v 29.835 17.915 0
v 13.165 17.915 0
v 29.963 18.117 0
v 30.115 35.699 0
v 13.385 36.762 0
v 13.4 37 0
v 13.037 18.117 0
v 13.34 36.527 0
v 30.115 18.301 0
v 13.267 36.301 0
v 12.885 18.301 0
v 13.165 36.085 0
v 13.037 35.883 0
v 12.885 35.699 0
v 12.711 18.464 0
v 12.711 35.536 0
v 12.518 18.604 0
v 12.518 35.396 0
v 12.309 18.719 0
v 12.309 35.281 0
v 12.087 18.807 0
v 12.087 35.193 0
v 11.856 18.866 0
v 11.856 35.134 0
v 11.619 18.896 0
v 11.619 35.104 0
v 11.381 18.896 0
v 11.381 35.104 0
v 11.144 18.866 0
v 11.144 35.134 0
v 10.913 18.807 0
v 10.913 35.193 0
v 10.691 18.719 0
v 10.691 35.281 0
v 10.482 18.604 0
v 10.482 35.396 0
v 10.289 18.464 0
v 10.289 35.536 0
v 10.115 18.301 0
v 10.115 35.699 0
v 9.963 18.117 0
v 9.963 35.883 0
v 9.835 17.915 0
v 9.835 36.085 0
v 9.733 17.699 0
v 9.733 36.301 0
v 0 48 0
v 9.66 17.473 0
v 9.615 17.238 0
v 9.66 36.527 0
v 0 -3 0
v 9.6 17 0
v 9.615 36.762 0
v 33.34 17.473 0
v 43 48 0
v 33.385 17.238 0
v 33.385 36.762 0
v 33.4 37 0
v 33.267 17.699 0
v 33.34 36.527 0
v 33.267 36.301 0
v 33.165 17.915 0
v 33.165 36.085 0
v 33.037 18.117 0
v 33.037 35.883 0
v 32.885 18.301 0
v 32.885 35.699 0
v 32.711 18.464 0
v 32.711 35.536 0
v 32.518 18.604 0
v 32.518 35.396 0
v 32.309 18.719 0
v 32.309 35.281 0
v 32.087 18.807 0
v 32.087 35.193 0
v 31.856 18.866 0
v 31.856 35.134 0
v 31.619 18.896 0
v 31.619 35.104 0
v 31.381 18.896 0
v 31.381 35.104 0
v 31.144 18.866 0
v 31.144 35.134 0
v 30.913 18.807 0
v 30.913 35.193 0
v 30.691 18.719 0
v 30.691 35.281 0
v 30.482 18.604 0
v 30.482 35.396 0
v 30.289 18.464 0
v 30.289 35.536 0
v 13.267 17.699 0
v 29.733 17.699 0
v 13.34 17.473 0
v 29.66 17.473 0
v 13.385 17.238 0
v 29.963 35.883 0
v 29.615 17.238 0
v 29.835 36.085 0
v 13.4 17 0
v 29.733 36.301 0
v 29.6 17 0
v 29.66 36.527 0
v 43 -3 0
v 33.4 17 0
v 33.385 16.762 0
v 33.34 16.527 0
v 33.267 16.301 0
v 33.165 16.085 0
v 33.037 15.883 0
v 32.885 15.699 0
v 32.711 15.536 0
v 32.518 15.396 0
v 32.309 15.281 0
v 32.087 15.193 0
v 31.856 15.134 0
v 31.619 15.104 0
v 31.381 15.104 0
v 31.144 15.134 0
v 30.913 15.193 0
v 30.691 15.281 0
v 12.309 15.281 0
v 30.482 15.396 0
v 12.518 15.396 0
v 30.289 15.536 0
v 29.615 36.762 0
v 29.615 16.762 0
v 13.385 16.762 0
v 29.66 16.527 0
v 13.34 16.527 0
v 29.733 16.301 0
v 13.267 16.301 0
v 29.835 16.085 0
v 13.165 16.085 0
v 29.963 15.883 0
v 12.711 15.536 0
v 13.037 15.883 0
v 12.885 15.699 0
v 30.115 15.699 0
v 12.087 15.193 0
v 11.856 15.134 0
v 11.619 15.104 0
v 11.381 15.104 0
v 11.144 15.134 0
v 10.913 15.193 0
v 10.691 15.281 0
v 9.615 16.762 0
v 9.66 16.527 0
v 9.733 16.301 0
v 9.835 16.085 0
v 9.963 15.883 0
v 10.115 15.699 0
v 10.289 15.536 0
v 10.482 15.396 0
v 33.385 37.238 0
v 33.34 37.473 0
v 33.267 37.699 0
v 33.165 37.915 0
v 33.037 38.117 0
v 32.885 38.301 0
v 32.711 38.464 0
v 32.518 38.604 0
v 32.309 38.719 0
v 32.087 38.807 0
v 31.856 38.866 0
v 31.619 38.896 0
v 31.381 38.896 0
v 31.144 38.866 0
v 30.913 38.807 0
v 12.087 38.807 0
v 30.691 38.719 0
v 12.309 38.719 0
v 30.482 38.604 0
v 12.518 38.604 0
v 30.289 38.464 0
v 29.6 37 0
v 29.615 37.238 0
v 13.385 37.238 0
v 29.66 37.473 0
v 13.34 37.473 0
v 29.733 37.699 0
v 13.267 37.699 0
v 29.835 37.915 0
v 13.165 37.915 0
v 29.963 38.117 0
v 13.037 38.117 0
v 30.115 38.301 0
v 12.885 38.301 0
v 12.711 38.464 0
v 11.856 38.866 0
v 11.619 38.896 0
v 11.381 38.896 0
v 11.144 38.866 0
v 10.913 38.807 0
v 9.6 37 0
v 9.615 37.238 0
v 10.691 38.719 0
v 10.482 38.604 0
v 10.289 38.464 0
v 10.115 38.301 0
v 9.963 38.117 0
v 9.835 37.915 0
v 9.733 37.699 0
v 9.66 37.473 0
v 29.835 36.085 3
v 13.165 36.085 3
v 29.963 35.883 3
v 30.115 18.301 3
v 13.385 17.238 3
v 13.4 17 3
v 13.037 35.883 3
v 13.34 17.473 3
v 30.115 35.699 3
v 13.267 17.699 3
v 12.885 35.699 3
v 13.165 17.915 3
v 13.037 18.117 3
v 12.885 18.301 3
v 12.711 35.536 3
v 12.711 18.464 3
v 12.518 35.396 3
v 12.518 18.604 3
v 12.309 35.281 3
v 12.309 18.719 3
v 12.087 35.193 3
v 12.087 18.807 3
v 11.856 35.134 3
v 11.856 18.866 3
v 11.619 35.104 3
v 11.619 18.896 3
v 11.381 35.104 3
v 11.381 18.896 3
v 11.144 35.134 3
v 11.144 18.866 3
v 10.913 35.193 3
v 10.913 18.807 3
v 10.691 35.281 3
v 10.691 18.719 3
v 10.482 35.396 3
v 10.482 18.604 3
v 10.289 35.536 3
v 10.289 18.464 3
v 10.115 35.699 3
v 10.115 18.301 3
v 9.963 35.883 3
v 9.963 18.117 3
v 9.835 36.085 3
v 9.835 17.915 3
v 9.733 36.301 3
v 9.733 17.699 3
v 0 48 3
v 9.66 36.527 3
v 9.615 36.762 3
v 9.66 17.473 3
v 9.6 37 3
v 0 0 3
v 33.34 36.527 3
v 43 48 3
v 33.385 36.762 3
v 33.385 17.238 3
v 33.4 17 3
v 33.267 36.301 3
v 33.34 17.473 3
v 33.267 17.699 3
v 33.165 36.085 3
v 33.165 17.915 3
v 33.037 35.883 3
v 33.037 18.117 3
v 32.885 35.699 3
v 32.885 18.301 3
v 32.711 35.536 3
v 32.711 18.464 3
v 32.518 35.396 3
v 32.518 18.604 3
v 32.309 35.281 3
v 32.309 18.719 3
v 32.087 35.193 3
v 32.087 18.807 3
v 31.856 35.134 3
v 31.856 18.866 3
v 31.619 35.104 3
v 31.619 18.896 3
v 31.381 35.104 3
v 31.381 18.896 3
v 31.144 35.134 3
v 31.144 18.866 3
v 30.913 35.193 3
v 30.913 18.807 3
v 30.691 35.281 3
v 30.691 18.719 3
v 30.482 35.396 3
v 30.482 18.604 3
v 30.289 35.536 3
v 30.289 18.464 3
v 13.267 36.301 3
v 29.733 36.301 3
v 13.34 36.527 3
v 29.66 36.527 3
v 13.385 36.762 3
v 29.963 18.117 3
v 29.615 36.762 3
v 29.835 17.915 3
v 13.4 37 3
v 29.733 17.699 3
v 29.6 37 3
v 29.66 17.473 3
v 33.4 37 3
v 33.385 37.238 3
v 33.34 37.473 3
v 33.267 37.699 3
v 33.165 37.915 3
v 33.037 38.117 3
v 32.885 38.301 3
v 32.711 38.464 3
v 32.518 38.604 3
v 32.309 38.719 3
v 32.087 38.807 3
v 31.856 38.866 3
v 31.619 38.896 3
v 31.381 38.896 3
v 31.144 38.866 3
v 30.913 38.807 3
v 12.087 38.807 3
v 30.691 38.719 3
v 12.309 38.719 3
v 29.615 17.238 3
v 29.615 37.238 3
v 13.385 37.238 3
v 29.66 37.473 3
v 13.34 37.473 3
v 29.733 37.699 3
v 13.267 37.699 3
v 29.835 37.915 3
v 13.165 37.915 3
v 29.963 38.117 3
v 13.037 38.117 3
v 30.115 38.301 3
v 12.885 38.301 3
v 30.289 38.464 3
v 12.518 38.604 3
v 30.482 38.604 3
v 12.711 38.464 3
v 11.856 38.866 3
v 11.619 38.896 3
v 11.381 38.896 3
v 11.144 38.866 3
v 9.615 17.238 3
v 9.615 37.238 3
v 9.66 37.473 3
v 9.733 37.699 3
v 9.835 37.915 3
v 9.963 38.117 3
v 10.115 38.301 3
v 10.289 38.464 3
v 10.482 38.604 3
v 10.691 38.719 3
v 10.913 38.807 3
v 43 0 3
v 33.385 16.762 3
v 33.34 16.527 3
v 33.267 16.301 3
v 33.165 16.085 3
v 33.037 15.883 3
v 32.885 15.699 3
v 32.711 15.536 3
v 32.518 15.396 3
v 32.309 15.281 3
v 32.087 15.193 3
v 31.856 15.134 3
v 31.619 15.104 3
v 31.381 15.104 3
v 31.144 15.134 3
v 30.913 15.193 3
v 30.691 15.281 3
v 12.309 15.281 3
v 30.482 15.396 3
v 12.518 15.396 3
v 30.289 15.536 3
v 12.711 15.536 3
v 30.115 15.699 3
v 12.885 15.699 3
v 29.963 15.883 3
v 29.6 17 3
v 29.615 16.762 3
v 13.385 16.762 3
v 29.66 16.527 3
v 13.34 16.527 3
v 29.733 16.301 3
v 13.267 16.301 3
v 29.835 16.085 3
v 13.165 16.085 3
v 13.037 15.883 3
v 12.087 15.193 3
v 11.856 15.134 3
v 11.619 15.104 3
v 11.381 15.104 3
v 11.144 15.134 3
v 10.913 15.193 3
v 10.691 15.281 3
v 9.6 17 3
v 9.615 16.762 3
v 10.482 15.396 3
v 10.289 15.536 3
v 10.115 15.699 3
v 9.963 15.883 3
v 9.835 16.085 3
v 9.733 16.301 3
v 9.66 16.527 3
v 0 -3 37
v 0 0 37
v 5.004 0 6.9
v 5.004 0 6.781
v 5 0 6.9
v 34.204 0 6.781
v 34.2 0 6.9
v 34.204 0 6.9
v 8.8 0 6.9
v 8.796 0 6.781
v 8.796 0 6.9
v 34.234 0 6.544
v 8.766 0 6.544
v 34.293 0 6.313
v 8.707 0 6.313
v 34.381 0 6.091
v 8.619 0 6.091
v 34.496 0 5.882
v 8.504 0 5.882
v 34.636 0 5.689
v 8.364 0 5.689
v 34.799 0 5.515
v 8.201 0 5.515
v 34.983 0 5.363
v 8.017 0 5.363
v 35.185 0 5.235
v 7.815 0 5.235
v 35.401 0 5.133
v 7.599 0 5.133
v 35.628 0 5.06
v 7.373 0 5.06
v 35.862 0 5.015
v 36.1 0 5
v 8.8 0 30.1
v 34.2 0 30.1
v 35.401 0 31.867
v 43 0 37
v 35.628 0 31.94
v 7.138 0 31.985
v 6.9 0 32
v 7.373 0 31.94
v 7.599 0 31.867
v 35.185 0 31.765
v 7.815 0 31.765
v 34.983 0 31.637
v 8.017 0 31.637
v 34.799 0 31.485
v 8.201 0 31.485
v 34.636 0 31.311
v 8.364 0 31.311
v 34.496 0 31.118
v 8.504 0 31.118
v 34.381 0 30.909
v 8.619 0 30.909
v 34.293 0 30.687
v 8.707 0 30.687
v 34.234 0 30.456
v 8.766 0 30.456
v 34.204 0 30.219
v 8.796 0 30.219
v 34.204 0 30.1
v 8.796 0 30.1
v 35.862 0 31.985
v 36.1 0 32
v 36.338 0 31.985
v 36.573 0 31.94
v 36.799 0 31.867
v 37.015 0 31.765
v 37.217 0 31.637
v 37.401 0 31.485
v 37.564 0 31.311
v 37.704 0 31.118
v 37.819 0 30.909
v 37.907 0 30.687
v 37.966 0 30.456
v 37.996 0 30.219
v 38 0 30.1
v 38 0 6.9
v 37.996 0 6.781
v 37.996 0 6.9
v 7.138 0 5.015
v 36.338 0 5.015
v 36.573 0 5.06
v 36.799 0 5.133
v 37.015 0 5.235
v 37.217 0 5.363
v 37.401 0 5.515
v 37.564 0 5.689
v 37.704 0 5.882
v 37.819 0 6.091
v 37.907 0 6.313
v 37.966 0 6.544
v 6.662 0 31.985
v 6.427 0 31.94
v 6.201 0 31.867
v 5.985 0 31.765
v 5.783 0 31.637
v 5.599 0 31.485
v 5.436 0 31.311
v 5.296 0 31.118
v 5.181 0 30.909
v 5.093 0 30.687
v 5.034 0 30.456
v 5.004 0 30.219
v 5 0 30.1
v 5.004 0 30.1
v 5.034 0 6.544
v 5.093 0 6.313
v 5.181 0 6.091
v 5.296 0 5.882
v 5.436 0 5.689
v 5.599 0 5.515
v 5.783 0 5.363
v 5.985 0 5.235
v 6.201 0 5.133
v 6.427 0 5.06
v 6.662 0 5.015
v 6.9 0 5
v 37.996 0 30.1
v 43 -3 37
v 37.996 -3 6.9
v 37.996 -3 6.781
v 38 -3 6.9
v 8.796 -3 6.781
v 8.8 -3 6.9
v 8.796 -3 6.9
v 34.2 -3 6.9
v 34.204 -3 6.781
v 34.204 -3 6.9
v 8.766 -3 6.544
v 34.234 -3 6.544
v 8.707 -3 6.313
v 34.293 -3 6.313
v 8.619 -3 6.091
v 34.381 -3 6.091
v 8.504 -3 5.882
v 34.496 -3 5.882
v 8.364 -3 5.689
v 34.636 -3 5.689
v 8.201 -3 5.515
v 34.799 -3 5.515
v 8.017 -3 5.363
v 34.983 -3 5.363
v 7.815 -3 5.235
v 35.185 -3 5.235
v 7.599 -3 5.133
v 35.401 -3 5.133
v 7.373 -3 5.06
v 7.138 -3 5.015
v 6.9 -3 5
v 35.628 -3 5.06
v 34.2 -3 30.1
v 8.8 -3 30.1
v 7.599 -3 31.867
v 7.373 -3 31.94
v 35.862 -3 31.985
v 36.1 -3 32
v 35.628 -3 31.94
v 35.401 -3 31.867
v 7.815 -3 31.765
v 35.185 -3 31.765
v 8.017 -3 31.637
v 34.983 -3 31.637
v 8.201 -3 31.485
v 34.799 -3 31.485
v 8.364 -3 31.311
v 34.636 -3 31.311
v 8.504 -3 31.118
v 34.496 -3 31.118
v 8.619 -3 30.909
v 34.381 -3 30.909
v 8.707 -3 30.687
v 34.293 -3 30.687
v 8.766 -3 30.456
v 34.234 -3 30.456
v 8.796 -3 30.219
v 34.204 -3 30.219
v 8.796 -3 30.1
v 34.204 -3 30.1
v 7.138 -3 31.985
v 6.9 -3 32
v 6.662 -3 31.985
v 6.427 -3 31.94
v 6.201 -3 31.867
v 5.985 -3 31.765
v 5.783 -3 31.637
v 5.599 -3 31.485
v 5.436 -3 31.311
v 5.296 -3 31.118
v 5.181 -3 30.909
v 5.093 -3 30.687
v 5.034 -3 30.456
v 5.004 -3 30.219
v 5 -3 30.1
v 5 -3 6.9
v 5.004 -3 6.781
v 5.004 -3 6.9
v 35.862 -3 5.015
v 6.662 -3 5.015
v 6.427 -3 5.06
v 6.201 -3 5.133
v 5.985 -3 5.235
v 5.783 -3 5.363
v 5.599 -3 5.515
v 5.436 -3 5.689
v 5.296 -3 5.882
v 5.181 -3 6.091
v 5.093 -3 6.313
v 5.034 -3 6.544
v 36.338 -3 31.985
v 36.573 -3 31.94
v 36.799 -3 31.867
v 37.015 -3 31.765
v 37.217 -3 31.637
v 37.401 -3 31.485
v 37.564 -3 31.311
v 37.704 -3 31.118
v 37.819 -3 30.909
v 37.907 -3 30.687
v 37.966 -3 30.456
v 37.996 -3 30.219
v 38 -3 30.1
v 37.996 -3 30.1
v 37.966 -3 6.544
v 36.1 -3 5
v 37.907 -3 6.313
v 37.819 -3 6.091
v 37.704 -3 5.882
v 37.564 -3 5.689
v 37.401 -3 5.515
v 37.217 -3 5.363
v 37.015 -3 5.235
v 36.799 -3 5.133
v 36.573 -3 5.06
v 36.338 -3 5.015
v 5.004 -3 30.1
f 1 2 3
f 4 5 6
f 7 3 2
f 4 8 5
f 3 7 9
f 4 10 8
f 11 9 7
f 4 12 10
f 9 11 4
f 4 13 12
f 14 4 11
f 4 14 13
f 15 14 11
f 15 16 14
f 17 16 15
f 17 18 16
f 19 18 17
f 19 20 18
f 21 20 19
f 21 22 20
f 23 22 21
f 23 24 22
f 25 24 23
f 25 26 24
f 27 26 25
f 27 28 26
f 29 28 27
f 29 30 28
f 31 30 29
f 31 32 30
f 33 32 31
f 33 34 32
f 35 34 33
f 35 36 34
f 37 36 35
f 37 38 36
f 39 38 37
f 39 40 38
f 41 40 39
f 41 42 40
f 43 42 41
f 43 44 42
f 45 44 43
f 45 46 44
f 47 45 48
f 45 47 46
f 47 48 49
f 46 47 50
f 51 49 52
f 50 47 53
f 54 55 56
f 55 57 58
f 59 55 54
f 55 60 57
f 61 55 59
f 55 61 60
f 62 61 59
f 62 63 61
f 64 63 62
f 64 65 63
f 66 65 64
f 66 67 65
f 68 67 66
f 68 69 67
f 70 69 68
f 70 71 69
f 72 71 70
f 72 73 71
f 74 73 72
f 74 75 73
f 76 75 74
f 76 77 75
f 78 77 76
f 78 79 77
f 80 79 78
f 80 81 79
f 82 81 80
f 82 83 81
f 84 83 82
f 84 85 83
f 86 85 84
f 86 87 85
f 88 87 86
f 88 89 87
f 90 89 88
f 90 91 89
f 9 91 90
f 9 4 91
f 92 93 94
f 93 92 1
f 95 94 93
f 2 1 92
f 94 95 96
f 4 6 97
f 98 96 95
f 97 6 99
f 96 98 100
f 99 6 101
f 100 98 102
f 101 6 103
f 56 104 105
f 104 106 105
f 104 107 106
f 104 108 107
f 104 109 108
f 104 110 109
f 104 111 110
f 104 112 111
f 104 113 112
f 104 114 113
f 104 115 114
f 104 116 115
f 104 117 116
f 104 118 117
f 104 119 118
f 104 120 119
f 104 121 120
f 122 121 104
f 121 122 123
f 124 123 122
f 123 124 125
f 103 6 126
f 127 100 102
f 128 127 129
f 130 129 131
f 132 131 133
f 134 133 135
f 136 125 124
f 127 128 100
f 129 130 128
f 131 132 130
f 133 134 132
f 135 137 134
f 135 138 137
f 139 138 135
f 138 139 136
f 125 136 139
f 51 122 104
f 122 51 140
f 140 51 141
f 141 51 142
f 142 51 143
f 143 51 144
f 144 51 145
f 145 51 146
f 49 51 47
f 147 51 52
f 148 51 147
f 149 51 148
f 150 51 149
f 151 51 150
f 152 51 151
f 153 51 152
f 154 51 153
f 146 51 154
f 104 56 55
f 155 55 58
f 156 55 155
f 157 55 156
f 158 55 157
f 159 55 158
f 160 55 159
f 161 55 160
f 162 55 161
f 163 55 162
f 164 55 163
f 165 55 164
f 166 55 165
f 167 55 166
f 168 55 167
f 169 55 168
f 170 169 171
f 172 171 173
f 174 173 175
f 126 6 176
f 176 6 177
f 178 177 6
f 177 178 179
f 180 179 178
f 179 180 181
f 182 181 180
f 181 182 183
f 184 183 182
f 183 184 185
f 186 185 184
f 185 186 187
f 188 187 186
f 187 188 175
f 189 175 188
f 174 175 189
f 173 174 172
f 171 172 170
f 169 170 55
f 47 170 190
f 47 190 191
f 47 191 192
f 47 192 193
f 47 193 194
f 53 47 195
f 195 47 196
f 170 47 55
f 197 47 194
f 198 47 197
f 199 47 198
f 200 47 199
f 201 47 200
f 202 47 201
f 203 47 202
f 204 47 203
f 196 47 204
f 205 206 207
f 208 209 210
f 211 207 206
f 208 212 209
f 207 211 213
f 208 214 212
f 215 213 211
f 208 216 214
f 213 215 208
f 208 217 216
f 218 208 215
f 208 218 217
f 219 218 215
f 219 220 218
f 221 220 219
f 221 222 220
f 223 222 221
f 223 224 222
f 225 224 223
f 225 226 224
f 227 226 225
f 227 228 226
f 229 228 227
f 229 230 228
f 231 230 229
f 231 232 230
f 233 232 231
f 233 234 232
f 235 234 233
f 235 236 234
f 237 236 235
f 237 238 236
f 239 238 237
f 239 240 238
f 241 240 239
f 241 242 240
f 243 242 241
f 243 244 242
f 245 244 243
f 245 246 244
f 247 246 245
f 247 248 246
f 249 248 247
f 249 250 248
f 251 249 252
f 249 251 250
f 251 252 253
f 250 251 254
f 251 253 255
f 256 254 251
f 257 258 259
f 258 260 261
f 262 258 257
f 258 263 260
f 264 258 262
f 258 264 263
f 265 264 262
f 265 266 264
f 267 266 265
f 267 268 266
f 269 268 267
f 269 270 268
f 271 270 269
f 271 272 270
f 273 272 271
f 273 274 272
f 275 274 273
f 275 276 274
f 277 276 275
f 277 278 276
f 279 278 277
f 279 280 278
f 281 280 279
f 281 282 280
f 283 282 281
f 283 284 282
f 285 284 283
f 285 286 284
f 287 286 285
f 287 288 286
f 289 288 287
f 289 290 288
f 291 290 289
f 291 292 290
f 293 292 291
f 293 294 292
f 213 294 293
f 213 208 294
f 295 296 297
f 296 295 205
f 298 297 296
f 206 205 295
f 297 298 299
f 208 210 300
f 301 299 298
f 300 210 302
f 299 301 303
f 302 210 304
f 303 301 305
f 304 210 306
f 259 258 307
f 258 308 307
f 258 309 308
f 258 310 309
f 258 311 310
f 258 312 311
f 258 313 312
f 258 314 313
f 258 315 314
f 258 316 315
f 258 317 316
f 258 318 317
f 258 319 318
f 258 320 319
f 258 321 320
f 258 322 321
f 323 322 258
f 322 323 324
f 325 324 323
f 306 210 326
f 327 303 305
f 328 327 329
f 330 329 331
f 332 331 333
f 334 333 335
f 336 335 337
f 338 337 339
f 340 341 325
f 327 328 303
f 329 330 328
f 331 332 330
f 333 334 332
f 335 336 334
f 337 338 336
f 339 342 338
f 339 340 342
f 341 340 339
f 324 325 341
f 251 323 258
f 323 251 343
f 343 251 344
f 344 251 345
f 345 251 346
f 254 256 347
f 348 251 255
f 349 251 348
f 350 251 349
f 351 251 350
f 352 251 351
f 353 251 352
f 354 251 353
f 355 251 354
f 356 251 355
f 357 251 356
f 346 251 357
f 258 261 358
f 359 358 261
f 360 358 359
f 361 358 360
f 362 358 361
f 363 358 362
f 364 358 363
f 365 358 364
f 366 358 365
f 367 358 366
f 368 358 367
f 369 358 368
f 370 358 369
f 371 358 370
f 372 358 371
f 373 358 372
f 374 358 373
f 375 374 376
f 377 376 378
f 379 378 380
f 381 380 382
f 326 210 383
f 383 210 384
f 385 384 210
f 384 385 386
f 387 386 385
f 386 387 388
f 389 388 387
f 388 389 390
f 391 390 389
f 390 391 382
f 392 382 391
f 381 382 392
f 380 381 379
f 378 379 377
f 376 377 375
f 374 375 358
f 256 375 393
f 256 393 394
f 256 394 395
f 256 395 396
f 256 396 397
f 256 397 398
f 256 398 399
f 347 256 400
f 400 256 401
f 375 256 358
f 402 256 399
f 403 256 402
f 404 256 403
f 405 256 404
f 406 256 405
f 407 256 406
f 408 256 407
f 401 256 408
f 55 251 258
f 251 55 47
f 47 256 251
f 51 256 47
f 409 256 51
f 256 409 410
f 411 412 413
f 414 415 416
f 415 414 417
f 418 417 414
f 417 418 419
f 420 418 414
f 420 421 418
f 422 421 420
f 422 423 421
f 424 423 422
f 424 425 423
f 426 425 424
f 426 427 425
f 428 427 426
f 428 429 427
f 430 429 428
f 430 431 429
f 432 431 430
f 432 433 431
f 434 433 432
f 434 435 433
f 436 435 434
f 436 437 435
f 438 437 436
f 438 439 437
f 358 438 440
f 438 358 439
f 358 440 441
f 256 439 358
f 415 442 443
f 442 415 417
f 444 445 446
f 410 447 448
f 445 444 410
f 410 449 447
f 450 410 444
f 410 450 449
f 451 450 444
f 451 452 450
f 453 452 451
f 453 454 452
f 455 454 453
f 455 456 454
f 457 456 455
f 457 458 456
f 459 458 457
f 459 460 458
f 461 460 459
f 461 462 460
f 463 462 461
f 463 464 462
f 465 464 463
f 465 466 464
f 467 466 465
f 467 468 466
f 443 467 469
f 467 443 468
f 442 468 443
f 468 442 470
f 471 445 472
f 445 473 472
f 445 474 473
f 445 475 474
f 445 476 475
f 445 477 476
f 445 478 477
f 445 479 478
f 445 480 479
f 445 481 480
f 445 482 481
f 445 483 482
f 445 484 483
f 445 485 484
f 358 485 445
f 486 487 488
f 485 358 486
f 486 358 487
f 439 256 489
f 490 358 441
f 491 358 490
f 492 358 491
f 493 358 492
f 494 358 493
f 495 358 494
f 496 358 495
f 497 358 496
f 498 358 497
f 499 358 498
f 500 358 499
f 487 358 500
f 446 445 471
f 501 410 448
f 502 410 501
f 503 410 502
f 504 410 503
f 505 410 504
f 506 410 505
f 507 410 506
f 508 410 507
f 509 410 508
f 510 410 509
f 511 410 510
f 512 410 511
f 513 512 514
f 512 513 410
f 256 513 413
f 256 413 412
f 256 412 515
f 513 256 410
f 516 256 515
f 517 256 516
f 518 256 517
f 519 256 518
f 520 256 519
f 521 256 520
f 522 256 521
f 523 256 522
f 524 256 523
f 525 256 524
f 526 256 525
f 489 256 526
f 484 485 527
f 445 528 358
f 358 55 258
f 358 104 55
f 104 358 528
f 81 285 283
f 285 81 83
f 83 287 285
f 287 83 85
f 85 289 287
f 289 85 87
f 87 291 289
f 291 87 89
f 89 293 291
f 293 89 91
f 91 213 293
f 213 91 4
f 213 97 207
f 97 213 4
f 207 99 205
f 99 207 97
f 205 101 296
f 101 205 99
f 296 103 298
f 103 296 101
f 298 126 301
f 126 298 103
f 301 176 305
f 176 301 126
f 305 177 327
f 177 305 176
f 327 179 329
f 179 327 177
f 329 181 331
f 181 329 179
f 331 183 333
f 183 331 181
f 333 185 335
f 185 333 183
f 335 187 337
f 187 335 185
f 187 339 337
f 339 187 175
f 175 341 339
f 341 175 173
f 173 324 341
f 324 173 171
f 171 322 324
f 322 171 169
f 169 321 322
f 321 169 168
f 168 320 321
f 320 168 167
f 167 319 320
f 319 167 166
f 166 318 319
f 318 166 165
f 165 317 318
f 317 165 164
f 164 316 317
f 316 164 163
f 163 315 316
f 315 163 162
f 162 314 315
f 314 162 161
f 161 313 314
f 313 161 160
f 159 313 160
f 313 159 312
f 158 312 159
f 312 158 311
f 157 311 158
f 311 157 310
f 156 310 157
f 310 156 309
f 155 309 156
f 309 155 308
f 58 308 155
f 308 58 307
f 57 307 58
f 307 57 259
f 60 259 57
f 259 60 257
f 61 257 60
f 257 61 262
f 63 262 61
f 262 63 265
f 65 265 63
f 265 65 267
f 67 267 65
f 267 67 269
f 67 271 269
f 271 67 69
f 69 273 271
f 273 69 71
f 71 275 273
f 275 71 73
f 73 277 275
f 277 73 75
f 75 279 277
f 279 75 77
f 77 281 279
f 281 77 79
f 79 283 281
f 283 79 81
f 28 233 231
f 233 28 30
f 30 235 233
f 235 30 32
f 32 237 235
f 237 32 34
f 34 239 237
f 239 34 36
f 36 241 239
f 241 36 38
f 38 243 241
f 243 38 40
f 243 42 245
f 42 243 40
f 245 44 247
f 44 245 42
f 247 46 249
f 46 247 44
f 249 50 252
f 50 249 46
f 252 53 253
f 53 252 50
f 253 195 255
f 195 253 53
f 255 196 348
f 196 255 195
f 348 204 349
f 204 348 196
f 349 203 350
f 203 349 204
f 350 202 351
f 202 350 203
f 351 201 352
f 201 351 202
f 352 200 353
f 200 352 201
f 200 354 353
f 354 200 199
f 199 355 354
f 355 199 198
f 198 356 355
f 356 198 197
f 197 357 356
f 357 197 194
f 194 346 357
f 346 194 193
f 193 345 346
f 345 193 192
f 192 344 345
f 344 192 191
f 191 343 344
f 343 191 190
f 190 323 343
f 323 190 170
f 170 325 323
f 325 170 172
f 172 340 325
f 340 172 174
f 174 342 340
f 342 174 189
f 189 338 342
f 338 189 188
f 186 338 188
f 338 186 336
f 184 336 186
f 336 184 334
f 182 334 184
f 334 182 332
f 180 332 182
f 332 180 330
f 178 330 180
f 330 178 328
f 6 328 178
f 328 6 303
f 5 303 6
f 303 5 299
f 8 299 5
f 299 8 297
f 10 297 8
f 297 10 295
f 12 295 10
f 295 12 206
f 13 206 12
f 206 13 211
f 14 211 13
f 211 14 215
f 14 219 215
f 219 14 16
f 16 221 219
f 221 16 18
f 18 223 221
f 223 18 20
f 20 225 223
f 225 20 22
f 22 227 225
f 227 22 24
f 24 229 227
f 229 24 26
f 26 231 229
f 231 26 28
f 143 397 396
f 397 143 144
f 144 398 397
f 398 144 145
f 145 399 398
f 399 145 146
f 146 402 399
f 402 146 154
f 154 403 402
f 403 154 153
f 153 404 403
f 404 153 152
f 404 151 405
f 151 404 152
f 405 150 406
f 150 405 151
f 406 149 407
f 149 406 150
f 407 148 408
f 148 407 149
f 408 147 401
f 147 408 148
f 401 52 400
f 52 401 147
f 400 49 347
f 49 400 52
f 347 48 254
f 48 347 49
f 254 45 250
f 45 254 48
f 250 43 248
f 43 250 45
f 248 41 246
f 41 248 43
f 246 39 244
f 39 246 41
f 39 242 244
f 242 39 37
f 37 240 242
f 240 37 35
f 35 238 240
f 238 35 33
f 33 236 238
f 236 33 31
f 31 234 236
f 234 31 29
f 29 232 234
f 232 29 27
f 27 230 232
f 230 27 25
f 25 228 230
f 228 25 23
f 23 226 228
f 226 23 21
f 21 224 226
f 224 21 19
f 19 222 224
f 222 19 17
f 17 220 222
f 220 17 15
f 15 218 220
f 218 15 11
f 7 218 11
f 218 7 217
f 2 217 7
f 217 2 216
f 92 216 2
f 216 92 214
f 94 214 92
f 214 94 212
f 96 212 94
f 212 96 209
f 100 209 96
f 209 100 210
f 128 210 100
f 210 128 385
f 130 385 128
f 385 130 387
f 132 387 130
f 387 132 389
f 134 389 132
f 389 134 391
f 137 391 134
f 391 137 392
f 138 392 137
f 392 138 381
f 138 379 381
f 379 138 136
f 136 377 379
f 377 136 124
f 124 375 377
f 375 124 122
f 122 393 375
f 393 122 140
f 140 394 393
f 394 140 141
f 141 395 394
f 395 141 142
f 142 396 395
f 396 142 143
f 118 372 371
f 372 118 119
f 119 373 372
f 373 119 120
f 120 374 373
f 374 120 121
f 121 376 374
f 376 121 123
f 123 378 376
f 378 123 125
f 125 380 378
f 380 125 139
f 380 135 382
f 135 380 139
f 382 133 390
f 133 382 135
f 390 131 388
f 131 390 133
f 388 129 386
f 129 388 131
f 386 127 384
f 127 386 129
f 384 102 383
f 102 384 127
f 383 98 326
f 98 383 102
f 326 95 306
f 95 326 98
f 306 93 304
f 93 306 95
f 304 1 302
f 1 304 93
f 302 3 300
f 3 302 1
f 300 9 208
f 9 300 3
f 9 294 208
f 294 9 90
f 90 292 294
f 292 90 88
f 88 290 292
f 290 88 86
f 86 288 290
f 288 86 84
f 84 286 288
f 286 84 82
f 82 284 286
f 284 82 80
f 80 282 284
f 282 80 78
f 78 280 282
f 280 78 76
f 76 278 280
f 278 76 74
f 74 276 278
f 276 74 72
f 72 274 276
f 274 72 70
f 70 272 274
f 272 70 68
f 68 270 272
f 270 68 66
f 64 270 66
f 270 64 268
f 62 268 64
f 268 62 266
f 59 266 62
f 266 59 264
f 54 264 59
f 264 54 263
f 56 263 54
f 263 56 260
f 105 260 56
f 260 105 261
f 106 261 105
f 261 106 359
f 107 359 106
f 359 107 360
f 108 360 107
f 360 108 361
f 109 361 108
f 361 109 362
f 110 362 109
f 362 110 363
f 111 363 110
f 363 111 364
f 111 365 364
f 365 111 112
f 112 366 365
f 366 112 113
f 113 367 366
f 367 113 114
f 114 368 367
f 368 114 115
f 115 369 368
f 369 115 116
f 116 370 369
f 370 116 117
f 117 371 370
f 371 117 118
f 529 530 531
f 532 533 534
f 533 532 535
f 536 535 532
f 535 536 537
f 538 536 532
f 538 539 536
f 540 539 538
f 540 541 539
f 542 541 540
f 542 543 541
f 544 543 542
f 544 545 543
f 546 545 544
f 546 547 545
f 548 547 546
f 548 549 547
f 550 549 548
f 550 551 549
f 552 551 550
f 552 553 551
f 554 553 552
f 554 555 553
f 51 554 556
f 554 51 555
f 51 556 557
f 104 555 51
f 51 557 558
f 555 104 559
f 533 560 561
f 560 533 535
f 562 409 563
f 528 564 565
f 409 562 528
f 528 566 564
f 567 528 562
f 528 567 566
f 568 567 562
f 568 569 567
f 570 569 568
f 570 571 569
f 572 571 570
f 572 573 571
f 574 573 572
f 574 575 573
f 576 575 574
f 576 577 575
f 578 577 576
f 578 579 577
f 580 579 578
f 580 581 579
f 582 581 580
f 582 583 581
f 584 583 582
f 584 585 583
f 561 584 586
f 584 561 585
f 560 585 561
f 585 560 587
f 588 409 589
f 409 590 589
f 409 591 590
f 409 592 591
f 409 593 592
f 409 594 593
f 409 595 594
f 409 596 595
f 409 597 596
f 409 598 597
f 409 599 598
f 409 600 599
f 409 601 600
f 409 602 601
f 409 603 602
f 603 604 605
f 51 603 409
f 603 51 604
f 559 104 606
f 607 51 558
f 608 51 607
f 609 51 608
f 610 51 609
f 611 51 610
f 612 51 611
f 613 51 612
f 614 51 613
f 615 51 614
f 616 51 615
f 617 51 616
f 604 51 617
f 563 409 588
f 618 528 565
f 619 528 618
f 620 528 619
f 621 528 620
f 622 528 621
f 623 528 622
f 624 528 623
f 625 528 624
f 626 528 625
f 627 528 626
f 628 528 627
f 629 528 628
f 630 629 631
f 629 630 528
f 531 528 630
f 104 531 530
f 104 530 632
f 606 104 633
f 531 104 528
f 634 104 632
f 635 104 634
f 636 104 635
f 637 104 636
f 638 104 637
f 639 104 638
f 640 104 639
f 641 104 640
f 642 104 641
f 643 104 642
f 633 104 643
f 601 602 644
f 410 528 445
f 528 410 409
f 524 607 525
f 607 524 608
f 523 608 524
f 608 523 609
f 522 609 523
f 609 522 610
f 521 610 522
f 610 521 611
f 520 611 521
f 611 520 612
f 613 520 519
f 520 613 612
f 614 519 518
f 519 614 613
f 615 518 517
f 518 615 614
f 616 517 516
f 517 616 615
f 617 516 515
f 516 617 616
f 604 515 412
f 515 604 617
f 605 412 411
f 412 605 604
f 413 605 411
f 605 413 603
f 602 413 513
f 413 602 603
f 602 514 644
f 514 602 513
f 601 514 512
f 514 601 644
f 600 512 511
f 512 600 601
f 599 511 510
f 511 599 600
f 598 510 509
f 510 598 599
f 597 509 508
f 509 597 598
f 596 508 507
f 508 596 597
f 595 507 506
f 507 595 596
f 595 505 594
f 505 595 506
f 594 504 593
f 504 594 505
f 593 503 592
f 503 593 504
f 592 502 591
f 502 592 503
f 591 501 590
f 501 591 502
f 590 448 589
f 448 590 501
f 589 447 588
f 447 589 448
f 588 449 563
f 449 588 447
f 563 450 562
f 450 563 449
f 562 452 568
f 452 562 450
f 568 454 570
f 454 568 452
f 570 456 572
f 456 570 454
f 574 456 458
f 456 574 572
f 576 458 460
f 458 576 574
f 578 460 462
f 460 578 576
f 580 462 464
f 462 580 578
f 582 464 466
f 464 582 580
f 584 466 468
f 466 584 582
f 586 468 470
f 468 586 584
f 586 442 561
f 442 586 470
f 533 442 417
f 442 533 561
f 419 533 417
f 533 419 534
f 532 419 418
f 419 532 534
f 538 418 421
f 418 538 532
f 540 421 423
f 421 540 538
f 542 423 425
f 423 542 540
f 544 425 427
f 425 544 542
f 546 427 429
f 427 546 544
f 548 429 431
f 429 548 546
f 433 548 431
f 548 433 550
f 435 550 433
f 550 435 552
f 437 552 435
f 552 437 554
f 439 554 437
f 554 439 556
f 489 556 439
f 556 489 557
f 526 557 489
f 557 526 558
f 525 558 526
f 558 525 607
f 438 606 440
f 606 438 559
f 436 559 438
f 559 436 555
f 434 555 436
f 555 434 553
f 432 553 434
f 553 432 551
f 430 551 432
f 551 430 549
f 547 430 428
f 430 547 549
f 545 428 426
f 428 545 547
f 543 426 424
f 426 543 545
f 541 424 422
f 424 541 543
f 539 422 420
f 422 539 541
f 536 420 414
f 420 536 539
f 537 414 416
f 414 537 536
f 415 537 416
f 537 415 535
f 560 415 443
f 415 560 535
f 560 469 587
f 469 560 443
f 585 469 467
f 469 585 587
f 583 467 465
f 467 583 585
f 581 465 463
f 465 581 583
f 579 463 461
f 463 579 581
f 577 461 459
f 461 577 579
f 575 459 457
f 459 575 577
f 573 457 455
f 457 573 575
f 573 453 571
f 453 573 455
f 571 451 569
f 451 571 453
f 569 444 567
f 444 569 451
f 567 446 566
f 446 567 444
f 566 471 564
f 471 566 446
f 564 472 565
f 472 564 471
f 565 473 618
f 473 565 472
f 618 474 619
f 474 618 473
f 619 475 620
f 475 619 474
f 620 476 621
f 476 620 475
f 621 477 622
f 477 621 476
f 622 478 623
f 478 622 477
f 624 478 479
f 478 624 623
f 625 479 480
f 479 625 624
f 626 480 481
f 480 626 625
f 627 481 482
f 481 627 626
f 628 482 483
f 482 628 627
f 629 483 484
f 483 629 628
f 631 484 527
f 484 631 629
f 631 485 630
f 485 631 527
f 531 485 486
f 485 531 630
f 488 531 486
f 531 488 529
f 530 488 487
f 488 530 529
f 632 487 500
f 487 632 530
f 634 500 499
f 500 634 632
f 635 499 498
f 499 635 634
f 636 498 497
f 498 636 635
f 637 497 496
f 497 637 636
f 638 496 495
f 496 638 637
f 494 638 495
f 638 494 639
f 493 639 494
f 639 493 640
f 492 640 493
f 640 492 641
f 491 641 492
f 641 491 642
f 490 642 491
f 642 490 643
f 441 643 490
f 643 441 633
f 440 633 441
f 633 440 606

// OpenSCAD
module mountHole() {
    circle(d=3.8, $fn=50);
}

module mountHolePattern() {
    mountHole();
    
    translate([20,0,0]) {
        mountHole();
    }
    
    translate([20,20,0]) {
        mountHole();
    }
    
    translate([0,20,0]) {
        mountHole();
    }
}

module lowerPlate() {
    difference() {
        square([43,48]);
        
        translate([11.5,17]) {
            mountHolePattern();
        }
    }
}

module roundSlot(d = 5, l = 10) {
   union() {
       r = d/2;
       
       translate([r,r,0]) {
           circle(d=d, $fn=50);
       }
       
       translate([r,0,0]) {
           square([l-d, d]);
       }
       
       translate([l-r,r,0]) {
           circle(d=d, $fn=50);
       }
   }
}

module frontPanel(h = 43, w = 20, slot_inset = 5, slot_d = 3.8) {
        difference() {
        square([h,w]);
            
        $slot_length = w - (slot_inset * 2);
        
        translate([slot_inset + slot_d, slot_inset, 0]) {
            rotate([0,0,90]) {
                roundSlot(d=slot_d,l=$slot_length);
            }
        }

        translate([h-slot_inset, slot_inset, 0]) {
            rotate([0,0,90]) {
                roundSlot(d=slot_d,l=$slot_length);
            }
        }
    }
}

union() {
    linear_extrude(3) {
        lowerPlate();
    }
    
    rotate([90,0,0]) {
        linear_extrude(3) {
            frontPanel(h=43, w=(20+17));
        }
    }
}
